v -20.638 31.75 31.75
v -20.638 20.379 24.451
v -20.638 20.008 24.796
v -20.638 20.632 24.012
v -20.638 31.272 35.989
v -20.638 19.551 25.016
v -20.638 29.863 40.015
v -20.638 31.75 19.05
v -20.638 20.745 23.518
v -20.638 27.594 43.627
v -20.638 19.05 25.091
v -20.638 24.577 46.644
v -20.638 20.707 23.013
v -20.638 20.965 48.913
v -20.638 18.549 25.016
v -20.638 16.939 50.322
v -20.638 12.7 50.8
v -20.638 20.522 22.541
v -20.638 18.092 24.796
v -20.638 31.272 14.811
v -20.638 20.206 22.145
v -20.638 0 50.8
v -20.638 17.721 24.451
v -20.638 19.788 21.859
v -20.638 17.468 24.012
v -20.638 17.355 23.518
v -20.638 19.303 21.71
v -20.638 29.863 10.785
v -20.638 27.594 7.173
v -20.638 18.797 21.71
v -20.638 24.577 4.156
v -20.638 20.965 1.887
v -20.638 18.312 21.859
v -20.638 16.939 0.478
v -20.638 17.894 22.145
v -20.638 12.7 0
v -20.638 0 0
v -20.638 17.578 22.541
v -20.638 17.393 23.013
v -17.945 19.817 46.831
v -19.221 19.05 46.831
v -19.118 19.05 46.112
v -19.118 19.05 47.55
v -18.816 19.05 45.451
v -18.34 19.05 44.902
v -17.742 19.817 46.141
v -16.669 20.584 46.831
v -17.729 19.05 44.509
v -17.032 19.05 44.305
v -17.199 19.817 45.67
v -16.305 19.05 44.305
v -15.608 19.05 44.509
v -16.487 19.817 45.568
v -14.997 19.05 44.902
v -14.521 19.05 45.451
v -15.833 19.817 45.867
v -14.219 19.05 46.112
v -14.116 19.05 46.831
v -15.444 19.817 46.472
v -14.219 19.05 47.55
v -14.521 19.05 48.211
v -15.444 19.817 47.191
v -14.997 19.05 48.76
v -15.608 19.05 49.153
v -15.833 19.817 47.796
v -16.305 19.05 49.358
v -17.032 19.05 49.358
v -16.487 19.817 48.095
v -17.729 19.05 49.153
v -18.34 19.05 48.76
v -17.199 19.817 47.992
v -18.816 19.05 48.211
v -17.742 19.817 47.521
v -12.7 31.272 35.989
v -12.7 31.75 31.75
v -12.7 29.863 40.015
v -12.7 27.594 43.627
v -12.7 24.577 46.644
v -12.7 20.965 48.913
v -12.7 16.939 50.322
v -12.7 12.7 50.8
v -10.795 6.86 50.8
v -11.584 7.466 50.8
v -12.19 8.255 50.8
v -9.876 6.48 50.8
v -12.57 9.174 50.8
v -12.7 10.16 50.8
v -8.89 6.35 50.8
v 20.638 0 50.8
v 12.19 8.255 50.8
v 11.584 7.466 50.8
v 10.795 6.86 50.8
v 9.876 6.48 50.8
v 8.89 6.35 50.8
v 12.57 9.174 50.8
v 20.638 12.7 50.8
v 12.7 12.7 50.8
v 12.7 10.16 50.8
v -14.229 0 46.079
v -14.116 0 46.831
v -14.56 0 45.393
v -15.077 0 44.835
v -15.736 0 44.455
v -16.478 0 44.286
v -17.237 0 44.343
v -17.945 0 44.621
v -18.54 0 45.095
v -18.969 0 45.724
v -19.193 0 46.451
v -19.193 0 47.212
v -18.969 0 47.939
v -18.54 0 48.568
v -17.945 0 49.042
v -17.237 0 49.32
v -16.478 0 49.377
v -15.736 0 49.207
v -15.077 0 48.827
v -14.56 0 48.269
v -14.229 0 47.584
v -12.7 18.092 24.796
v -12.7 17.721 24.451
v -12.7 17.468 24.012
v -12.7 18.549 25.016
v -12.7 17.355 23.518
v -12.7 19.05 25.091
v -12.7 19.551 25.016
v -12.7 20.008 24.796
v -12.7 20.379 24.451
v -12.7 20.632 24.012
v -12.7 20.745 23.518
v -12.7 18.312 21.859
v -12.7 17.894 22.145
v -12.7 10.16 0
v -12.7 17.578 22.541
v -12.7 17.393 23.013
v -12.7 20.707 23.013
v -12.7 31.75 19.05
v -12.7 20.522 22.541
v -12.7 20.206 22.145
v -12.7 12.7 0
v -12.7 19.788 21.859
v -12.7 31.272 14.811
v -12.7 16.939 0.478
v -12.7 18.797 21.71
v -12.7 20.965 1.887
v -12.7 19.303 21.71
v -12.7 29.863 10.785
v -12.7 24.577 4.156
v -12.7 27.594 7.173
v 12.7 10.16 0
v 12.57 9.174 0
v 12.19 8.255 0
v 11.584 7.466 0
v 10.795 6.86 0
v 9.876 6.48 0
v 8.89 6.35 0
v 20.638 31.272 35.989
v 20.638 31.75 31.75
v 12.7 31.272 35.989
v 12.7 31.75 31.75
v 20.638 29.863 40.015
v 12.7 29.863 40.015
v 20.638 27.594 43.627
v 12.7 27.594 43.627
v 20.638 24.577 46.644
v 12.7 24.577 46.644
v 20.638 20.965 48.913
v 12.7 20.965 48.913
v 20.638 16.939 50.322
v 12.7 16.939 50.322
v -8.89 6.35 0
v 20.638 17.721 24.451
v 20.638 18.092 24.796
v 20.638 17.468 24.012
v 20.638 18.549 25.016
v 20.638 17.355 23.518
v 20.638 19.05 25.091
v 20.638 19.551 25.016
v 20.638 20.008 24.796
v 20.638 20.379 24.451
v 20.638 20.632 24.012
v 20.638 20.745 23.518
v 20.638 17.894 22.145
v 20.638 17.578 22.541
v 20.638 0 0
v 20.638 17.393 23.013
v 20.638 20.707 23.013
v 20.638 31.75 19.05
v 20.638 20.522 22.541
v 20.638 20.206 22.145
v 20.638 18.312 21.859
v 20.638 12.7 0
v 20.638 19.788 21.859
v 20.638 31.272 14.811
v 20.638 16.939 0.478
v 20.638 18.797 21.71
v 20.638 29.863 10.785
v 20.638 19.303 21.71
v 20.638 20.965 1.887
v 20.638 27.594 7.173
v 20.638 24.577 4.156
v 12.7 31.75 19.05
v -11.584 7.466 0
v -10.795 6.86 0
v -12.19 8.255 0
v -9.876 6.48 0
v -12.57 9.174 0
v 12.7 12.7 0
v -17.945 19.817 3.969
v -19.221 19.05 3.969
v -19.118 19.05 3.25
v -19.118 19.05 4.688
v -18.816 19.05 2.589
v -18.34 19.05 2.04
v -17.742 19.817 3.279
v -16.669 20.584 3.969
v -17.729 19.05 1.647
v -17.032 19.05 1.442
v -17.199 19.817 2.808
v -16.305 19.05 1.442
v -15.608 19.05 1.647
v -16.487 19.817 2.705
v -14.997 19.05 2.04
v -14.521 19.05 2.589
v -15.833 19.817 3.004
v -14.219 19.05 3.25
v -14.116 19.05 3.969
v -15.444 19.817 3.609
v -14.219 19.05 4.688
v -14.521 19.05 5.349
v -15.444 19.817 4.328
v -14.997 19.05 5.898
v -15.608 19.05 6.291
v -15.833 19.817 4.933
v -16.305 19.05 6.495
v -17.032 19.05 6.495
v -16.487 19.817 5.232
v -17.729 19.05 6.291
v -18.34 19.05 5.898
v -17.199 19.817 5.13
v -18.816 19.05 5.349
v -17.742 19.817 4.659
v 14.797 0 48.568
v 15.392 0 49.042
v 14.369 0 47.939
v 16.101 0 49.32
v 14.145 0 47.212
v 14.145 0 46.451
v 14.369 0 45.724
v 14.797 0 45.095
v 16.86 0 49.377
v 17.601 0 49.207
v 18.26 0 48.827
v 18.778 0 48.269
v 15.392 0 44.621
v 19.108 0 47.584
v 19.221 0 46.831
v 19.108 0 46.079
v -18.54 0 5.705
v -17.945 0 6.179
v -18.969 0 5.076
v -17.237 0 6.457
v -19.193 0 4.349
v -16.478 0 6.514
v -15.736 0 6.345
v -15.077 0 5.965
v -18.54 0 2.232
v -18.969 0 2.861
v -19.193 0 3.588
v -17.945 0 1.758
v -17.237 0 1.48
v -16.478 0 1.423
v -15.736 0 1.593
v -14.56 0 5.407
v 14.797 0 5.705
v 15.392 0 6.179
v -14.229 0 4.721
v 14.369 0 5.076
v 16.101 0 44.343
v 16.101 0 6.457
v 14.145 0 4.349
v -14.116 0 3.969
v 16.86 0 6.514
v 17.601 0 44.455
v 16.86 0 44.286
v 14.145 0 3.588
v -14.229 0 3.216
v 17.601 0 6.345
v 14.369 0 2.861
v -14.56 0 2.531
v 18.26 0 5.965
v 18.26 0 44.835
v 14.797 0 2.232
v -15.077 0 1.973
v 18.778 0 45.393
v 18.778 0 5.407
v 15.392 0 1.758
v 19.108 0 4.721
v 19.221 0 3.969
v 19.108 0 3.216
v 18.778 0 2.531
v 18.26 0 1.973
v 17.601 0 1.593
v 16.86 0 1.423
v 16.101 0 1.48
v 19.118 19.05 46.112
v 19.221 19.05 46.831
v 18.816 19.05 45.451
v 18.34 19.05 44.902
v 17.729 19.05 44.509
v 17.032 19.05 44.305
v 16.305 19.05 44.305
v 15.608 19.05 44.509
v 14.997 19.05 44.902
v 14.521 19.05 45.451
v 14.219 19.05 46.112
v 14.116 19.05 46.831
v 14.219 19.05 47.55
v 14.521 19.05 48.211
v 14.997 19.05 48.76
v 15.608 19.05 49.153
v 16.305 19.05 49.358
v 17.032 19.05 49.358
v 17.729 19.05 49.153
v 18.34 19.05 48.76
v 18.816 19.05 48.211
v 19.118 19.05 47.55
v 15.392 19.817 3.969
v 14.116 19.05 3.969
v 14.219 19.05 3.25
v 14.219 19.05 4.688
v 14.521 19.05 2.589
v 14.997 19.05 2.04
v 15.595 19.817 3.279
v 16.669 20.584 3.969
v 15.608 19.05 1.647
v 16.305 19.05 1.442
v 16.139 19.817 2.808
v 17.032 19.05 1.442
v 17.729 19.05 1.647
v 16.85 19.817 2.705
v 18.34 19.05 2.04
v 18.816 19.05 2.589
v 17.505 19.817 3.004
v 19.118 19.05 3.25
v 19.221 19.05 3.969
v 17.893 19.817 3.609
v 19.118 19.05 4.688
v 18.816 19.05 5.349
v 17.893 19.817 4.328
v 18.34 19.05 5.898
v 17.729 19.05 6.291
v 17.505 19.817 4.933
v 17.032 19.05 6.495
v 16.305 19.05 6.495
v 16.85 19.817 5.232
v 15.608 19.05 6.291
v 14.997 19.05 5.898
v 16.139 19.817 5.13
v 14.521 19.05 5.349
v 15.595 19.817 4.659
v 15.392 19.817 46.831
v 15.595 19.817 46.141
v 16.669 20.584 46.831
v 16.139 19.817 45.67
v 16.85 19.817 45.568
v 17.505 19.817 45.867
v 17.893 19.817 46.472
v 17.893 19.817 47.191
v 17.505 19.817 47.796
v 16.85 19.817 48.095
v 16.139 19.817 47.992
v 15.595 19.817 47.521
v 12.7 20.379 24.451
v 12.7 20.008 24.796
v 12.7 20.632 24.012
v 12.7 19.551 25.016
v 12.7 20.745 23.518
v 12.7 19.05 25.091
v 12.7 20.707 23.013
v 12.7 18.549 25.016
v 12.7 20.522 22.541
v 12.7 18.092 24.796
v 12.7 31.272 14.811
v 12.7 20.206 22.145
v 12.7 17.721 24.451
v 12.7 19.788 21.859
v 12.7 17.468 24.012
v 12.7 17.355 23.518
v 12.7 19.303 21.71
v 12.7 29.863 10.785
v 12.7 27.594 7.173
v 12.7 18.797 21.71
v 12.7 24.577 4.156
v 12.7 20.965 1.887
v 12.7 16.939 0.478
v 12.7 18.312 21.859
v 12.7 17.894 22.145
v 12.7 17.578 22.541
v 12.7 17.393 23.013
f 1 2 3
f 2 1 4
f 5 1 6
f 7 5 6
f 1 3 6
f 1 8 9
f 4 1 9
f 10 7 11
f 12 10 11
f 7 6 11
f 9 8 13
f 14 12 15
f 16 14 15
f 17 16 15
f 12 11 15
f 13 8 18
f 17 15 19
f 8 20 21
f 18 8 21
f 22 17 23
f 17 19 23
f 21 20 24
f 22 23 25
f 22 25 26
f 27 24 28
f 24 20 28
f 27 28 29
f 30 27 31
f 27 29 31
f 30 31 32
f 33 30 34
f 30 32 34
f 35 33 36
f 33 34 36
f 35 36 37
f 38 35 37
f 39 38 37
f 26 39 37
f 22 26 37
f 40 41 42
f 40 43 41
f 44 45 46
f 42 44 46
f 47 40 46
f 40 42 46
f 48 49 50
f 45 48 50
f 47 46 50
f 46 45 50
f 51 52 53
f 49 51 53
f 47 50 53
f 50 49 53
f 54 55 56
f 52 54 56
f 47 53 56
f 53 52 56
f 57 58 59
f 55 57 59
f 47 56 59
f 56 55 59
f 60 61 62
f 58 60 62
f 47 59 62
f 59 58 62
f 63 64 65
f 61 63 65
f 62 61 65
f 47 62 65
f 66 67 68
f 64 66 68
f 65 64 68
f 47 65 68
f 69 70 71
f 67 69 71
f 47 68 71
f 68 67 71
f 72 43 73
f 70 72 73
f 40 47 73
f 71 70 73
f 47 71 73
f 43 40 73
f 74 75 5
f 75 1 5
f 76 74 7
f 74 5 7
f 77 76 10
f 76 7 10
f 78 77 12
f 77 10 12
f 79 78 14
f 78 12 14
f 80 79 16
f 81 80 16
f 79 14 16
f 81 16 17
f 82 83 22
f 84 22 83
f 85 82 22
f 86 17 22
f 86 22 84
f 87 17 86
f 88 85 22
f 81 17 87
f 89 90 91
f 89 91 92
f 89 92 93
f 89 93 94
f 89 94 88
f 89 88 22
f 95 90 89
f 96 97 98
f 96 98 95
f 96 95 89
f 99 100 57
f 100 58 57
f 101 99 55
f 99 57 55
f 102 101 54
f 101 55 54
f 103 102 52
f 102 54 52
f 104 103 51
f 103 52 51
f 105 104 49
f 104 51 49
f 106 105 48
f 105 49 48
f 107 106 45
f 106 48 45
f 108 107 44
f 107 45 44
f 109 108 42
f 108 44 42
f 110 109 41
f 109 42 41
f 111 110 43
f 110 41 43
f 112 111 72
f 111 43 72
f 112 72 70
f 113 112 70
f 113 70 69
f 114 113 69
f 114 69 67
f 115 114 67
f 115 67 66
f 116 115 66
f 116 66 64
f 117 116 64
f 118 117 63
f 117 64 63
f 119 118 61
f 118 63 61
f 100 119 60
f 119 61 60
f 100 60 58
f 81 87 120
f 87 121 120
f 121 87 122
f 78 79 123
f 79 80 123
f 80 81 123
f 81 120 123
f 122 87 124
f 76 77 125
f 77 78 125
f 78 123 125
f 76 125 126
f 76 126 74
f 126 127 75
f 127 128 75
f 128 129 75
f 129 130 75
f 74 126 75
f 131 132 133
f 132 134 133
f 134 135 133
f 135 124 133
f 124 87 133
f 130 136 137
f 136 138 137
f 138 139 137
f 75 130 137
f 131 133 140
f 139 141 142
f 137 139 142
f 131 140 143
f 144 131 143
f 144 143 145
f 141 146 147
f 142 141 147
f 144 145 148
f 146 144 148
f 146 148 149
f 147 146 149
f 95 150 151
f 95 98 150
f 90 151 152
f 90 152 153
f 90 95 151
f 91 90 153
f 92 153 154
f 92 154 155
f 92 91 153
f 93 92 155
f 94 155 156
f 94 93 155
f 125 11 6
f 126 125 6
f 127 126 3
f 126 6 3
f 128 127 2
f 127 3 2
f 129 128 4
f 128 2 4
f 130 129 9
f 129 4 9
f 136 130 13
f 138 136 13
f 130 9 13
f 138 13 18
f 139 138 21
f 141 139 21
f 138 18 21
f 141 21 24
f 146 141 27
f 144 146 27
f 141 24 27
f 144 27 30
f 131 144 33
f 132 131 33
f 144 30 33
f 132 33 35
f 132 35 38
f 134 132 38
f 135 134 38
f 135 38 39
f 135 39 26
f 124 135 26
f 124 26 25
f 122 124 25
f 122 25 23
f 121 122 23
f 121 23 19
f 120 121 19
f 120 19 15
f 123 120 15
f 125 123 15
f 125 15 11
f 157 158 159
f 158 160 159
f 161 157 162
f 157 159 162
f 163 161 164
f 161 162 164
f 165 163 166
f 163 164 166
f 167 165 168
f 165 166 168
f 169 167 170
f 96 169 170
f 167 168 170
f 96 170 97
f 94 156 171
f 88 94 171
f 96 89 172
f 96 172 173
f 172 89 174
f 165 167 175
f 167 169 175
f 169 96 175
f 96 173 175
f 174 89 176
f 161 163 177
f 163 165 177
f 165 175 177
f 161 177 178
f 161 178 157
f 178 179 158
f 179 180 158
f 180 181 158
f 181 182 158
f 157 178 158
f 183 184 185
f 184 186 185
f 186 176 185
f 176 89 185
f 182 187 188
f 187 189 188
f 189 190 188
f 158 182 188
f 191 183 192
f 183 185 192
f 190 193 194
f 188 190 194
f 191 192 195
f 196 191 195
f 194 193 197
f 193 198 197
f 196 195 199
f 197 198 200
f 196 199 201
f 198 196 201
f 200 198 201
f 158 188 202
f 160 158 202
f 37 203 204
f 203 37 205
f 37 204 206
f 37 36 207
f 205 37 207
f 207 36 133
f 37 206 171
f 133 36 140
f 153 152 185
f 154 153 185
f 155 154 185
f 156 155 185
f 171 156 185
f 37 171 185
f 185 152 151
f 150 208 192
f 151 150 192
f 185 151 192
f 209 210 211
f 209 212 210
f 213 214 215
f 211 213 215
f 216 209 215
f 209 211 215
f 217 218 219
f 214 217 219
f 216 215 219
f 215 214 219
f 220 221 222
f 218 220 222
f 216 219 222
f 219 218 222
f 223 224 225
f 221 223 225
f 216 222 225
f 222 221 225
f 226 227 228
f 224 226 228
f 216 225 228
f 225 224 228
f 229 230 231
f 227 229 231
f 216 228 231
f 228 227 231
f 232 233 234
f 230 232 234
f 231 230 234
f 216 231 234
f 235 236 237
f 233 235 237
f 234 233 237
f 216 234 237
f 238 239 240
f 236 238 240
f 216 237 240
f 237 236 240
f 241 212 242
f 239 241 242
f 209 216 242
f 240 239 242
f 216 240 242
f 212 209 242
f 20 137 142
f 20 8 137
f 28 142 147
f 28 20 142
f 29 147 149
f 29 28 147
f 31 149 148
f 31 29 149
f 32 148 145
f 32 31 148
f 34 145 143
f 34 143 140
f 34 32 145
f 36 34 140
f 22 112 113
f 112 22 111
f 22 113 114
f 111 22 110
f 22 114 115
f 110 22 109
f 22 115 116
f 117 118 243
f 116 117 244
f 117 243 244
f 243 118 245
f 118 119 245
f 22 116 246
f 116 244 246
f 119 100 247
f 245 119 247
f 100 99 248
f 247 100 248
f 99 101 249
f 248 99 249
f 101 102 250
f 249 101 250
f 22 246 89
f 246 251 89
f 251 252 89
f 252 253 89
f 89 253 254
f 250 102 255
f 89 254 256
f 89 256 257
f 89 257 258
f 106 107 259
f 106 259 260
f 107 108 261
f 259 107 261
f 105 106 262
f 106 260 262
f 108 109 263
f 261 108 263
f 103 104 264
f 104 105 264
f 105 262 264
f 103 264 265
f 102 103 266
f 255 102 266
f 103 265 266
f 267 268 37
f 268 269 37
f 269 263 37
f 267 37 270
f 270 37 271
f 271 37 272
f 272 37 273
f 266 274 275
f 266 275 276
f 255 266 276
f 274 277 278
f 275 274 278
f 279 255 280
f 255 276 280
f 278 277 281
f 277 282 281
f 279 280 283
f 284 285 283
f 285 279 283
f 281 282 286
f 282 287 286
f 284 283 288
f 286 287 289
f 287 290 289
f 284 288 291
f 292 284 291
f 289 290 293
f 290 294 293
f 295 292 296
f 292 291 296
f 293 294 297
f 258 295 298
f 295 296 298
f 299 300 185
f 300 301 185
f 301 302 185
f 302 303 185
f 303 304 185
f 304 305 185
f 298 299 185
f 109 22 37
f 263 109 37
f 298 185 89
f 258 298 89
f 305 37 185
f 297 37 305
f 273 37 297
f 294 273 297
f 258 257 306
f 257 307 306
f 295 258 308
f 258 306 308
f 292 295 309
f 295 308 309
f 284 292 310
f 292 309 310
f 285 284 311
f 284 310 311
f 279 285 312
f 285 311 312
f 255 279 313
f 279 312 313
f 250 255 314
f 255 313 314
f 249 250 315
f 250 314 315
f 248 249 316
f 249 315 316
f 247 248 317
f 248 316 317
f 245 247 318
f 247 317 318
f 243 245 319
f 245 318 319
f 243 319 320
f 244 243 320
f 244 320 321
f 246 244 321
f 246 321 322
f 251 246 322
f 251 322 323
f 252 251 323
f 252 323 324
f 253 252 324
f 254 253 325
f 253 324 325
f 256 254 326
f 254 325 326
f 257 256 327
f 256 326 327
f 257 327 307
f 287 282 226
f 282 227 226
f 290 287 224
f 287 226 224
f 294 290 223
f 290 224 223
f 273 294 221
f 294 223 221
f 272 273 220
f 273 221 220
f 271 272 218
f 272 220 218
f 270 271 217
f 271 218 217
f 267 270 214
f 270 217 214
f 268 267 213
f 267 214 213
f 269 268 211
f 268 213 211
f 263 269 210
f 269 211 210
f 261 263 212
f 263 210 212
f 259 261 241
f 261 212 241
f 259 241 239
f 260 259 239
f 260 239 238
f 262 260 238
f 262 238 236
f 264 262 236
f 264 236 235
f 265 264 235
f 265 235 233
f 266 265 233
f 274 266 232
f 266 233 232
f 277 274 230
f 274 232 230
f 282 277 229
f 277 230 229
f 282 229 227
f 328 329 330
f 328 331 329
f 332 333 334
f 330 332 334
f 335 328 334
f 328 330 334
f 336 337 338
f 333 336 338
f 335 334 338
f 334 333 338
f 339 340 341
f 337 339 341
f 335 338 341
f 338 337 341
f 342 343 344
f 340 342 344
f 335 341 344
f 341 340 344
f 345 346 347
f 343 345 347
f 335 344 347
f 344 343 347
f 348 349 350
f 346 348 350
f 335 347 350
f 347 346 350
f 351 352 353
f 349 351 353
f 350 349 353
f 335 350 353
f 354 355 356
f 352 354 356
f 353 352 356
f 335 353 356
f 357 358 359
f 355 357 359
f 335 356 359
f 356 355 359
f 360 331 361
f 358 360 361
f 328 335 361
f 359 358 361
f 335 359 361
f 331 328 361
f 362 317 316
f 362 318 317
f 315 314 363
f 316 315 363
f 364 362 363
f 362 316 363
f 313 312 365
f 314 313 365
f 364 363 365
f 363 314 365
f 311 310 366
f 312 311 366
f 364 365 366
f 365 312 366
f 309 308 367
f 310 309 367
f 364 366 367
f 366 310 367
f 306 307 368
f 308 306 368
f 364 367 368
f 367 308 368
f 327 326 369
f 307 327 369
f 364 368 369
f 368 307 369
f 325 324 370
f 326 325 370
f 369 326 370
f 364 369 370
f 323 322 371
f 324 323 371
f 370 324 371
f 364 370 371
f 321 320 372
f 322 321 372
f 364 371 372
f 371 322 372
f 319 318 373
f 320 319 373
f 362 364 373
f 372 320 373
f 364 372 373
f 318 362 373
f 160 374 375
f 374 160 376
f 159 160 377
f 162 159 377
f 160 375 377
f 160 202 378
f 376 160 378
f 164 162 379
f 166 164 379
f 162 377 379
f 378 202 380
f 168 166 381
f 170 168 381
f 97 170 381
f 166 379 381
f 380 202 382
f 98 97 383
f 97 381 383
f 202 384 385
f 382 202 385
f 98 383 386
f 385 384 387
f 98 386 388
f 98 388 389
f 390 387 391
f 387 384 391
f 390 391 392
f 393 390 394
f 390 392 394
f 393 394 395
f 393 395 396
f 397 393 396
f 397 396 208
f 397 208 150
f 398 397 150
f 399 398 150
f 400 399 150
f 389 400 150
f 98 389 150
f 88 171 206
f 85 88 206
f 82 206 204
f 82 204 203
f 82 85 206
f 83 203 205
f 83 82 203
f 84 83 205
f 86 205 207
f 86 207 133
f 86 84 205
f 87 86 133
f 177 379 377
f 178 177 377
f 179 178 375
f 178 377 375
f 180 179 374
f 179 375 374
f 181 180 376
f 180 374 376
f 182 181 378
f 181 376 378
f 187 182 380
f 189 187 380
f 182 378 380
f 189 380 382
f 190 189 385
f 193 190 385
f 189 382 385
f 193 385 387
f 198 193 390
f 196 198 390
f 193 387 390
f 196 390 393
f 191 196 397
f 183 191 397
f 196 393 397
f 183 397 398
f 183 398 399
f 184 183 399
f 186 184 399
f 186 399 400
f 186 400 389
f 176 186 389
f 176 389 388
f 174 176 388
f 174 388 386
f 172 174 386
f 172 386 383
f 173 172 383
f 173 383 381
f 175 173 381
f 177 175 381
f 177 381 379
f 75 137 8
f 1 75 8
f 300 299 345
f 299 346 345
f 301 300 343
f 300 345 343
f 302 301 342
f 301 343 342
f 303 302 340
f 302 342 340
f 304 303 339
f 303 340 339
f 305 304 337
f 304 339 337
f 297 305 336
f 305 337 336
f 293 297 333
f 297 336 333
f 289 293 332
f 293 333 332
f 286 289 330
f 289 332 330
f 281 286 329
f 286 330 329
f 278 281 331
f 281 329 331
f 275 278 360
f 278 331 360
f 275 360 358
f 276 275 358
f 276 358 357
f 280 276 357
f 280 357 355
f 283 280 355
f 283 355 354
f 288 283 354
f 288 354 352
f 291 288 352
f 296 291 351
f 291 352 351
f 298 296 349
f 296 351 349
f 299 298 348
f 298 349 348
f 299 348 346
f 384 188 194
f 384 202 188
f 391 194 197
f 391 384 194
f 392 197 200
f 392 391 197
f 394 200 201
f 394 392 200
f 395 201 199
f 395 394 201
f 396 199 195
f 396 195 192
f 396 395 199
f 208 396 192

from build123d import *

# Parameters (mm, degrees)
BOSS_EXTRUDE1_DEPTH         = 50.8
FILLET1_R                   = 19.05
FILLET3_R                   = 3.81
F_1_4_20_TAPPED_HOLE1_D     = 5.1054
F_1_4_20_TAPPED_HOLE1_DEPTH = 19.05
F_1_4_20_TAPPED_HOLE1_TIP   = 1.533816902
M3_CLEARANCE_HOLE2_D        = 3.4


with BuildPart() as part:
    # Sketch1 → Boss-Extrude1 (new body)
    with BuildSketch(Plane.XY):
        Polygon((-20.6375, 0), (20.6375, 0), (20.6375, 6.35), (20.6375, 31.75), (12.7, 31.75), (12.7, 6.35), (-12.7, 6.35), (-12.7, 31.75), (-20.6375, 31.75), (-20.6375, 6.35), align=None)
    extrude(amount=BOSS_EXTRUDE1_DEPTH)

    # Fillet1
    fillet1_edges = [part.edges().sort_by_distance(p)[0] for p in [
        (-16.66875, 31.75, 0),
        (16.66875, 31.75, 50.8),
        (16.66875, 31.75, 0),
        (-16.66875, 31.75, 50.8),
    ]]
    fillet(fillet1_edges, radius=FILLET1_R)

    # Fillet3
    fillet3_edges = [part.edges().sort_by_distance(p)[0] for p in [
        (-12.7, 6.35, 25.4),
        (12.7, 6.35, 25.4),
    ]]
    fillet(fillet3_edges, radius=FILLET3_R)

    # 1/4-20 Tapped Hole1
    with Locations(Plane(origin=(0, 0, 0), x_dir=(-1, 0, 0), z_dir=(0, -1, 0))):
        with Locations((-16.66875, -3.96875), (16.66875, -3.96875), (16.66875, -46.83125), (-16.66875, -46.83125)):
            Hole(F_1_4_20_TAPPED_HOLE1_D / 2, depth=F_1_4_20_TAPPED_HOLE1_DEPTH)
            with Locations((0, 0, -(F_1_4_20_TAPPED_HOLE1_DEPTH + F_1_4_20_TAPPED_HOLE1_TIP / 2))):  # 118° drill point
                Cone(0, F_1_4_20_TAPPED_HOLE1_D / 2, F_1_4_20_TAPPED_HOLE1_TIP, mode=Mode.SUBTRACT)

    # M3 Clearance Hole2 (through all)
    with Locations(Plane(origin=(20.6375, 0, 0), x_dir=(0, 0, -1), z_dir=(1, 0, 0))):
        with Locations((-23.391086867, 19.05)):
            Hole(M3_CLEARANCE_HOLE2_D / 2)


solid = part.part
